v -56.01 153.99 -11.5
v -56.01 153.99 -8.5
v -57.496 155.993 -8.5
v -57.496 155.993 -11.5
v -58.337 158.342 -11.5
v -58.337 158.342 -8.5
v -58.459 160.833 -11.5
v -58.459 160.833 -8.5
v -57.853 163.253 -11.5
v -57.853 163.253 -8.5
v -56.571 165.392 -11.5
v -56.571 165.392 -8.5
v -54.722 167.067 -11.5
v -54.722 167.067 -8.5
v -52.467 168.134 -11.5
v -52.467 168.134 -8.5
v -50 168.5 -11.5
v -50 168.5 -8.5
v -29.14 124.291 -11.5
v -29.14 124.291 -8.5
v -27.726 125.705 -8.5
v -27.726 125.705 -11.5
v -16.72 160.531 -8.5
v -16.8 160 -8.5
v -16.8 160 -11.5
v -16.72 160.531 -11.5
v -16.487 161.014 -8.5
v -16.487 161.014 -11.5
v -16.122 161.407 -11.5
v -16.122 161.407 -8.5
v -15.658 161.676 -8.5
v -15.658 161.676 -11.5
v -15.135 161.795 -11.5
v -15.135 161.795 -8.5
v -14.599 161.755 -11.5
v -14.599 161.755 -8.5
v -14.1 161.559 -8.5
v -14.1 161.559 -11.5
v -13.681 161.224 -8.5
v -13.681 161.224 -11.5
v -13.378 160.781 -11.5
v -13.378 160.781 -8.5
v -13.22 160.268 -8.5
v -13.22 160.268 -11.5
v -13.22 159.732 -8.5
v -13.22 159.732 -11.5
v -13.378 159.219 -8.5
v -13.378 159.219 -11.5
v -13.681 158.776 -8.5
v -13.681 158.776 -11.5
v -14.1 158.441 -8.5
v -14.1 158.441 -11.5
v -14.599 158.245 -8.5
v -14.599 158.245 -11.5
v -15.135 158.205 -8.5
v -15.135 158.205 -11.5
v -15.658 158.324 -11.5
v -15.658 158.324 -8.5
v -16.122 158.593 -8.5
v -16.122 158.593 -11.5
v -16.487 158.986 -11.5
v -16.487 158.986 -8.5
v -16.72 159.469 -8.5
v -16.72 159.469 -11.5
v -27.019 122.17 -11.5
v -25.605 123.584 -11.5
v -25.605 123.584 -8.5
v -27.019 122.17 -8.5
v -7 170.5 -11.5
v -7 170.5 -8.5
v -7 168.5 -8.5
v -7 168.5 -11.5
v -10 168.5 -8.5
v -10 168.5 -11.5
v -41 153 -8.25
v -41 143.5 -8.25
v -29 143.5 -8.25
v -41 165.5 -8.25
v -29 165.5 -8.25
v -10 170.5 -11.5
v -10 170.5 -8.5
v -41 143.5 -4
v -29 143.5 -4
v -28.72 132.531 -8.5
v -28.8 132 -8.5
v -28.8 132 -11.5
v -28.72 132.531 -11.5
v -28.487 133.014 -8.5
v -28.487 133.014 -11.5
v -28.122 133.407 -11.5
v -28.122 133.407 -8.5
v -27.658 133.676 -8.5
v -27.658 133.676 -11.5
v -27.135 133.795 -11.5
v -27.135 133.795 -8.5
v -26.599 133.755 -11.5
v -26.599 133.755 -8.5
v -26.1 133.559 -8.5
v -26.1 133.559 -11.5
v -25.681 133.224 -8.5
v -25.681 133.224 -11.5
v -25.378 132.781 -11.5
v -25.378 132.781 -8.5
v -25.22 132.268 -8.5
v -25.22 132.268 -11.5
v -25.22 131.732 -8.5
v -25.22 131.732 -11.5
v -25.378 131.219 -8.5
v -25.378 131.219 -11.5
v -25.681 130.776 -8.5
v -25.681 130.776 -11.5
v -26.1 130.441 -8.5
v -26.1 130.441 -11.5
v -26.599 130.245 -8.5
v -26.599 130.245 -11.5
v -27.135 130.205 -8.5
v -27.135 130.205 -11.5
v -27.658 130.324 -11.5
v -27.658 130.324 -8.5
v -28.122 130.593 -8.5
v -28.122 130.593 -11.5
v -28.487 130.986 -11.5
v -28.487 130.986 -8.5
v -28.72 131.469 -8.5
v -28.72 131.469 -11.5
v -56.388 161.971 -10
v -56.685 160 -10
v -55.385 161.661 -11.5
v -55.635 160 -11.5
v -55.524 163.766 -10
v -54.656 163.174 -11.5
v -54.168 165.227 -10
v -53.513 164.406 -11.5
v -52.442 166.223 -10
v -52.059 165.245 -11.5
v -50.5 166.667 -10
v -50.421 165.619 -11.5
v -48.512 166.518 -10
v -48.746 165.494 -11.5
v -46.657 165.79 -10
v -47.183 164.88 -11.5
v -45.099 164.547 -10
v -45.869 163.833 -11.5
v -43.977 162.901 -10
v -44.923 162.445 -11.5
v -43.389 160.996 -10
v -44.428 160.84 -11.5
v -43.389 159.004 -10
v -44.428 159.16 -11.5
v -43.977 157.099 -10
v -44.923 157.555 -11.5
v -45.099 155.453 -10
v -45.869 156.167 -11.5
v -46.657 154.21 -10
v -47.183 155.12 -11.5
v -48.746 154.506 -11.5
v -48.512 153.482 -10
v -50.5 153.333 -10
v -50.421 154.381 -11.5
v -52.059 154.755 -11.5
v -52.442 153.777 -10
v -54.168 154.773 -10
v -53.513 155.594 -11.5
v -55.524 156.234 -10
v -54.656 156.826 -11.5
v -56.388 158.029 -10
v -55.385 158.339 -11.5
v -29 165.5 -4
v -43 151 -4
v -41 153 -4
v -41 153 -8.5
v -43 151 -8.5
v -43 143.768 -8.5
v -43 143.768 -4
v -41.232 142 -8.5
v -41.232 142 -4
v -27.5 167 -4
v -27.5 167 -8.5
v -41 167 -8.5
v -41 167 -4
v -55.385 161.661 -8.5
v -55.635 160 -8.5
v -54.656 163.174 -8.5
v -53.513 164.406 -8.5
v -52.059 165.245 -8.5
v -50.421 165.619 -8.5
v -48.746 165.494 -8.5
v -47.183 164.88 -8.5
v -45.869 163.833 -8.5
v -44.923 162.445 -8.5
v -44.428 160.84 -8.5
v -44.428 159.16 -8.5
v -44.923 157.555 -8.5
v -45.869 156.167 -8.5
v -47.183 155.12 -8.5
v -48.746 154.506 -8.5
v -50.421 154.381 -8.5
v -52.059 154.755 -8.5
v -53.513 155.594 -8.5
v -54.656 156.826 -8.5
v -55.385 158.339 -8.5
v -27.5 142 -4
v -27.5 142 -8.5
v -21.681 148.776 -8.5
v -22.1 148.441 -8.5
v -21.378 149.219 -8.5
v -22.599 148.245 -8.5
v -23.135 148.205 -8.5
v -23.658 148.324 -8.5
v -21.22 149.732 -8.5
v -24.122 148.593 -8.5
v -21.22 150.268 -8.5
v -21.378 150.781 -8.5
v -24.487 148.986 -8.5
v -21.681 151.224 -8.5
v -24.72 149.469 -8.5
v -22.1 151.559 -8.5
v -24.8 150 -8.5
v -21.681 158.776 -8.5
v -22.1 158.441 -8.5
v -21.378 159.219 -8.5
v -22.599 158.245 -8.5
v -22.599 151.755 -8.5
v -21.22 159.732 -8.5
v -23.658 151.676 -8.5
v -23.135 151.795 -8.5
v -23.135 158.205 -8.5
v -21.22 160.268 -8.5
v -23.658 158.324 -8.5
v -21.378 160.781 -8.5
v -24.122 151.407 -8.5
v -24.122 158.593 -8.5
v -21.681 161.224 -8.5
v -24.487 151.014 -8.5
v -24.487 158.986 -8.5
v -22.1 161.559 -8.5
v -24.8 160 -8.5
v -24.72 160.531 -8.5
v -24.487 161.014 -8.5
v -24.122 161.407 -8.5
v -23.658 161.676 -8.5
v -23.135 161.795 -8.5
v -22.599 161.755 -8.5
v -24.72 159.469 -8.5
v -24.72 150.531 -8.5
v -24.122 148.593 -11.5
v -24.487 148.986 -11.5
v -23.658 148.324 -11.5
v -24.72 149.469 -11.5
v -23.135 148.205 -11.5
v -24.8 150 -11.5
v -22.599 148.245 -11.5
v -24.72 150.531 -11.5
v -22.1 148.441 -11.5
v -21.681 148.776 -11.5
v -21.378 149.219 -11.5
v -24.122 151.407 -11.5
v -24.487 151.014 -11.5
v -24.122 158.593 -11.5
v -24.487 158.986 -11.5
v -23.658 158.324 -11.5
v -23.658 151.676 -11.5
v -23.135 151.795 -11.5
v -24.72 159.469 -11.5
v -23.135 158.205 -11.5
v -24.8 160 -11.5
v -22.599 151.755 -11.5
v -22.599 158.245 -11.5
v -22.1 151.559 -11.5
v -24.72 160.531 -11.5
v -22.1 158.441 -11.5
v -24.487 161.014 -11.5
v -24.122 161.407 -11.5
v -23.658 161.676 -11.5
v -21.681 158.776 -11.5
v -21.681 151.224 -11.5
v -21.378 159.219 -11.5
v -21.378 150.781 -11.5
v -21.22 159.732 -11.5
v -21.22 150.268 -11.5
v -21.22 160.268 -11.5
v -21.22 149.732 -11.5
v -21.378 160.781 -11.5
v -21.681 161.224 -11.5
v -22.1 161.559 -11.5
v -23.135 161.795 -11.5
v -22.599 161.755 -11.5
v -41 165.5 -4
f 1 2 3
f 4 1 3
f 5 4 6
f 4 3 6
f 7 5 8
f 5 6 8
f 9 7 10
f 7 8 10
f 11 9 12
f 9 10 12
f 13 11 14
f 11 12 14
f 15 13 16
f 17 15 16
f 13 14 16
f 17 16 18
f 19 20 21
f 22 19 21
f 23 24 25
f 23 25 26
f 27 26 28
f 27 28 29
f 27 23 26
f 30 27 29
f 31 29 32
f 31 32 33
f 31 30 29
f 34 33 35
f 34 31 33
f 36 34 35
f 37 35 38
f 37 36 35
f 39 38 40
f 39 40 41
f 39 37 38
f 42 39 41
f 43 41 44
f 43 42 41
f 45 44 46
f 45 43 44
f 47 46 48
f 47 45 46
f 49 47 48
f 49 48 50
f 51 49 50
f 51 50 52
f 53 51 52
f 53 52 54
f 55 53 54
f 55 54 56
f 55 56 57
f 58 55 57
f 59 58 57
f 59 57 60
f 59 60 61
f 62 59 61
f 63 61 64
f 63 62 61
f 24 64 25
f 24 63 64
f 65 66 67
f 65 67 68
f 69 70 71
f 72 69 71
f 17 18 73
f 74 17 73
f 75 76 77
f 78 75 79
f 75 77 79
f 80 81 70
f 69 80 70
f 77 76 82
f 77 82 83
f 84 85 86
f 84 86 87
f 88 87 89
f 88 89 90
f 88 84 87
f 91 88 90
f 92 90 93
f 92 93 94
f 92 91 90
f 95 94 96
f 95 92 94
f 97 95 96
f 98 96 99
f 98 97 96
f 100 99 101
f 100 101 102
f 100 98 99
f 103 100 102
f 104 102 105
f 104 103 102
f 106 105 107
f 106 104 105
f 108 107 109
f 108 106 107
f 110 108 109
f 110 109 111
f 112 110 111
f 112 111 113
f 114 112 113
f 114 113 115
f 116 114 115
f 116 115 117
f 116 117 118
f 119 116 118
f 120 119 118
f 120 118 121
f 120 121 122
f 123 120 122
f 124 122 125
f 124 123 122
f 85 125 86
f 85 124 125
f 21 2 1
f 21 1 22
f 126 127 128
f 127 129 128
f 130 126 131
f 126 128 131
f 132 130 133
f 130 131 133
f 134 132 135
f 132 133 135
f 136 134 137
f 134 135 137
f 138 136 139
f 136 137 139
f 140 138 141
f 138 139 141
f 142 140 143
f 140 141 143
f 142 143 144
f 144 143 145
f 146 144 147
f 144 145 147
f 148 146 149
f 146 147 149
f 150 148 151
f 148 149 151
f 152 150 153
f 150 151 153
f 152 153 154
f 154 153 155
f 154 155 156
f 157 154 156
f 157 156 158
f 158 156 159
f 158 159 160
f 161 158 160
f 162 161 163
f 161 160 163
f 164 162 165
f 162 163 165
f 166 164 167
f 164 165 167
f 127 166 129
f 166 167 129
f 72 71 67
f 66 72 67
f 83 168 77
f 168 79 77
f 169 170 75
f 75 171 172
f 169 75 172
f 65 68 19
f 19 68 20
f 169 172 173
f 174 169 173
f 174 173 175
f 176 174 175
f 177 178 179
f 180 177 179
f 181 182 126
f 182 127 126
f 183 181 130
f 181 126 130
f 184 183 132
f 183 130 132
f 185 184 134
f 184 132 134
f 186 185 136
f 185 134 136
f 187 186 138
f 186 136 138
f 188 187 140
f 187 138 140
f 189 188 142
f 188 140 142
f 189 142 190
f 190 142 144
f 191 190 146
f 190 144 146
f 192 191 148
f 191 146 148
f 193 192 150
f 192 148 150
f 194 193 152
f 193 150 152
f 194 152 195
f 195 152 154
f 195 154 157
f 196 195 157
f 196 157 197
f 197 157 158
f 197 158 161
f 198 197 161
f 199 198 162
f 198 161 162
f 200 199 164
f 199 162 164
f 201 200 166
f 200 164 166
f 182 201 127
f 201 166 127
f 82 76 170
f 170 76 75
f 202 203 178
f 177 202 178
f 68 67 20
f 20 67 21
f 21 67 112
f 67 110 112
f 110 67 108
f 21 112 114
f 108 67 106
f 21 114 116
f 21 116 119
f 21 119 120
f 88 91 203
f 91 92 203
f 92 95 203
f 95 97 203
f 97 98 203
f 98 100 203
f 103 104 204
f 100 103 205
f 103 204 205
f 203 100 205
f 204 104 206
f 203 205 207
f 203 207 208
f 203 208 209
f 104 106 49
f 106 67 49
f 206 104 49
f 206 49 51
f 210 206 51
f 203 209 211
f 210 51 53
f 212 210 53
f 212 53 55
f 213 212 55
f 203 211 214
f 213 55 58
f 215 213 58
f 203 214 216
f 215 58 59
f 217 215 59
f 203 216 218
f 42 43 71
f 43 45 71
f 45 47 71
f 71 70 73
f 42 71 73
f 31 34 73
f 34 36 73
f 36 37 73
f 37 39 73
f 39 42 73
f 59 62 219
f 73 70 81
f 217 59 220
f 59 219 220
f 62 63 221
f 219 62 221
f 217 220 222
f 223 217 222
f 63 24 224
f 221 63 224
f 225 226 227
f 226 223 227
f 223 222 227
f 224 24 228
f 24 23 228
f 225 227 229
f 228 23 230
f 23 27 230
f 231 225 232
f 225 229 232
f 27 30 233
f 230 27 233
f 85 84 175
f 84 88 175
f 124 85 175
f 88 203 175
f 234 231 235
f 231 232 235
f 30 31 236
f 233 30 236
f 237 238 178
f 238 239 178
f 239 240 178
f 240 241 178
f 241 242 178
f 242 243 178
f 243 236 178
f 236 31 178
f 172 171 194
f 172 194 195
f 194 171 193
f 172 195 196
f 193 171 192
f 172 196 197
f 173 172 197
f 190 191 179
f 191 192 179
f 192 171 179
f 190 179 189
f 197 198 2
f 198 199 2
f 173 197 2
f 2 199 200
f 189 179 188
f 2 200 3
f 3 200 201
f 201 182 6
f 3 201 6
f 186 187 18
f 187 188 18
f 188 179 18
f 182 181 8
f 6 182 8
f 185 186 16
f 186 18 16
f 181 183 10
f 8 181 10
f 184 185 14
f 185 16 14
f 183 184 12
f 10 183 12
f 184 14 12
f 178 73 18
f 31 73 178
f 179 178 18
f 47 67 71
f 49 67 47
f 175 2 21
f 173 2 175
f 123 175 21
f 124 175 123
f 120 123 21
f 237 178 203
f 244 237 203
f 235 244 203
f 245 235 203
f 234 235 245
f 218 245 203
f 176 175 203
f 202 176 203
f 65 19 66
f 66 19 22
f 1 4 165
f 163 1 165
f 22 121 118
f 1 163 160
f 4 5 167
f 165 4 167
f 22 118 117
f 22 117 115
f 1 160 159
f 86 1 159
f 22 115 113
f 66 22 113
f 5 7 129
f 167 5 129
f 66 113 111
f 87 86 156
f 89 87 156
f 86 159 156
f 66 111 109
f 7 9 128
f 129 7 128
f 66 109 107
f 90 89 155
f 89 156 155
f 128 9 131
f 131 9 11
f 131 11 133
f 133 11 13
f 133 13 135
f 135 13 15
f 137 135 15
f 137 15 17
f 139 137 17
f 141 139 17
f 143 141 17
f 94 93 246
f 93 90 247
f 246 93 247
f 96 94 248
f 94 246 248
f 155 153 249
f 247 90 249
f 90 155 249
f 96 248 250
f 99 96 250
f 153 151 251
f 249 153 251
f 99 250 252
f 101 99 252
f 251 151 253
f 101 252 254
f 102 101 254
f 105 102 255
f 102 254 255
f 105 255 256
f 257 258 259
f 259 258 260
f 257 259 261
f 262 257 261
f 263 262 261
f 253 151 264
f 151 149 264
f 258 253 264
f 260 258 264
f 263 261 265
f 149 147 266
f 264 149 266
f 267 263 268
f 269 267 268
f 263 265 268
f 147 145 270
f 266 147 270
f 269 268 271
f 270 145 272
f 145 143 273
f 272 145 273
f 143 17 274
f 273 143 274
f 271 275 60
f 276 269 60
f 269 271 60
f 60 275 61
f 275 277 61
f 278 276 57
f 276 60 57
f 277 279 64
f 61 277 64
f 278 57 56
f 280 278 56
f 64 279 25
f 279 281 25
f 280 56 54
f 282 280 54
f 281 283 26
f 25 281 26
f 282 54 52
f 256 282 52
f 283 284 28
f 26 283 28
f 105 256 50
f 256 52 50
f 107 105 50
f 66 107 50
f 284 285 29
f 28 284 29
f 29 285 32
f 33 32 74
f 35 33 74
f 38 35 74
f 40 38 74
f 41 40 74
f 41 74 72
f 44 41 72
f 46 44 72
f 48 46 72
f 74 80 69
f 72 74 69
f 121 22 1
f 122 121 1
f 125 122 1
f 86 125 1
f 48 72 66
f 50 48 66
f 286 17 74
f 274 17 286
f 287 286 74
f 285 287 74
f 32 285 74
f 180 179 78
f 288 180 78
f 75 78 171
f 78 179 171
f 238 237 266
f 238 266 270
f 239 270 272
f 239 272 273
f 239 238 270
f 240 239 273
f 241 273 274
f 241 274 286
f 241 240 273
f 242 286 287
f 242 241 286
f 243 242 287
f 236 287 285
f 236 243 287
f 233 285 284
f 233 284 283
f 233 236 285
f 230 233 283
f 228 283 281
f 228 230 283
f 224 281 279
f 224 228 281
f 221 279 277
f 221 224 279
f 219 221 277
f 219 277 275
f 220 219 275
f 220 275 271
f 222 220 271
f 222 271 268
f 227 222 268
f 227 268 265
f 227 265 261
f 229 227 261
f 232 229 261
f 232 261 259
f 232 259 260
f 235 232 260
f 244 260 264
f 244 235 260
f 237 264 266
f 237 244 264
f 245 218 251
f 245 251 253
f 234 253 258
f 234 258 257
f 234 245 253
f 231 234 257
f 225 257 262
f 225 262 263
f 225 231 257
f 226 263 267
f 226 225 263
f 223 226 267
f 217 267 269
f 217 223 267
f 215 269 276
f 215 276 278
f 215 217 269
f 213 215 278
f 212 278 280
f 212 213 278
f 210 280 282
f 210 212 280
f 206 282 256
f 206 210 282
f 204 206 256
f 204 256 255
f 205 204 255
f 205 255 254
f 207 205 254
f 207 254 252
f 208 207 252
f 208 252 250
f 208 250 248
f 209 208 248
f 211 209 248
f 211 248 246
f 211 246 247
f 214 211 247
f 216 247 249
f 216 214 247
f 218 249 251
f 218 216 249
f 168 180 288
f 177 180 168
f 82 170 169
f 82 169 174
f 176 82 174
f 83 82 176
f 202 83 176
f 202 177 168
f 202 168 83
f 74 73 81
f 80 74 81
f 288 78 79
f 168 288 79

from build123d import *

# Parameters (mm, degrees)
SKETCH220_R     = 8
SKETCH220_R_2   = 1.8
PAD127056_DEPTH = 3
SKETCH185_R     = 1.5
PAD127021_DEPTH = 1.75
SKETCH184_W     = 22
SKETCH184_H     = 12
PAD127020_DEPTH = 22.5
PAD127023_DEPTH = 5


with BuildPart() as base:
    # Sketch220 → Pad127056 (new body)
    with BuildSketch(Plane(origin=(50, 160, -8.5), x_dir=(1, 0, 0), z_dir=(0, 0, 1))):
        with BuildLine():
            ThreePointArc((6.010433, -6.010382), (7.852969, 3.252826), (0, 8.5))
            Line((0, 8.5), (-40, 8.5))
            Line((-40, 8.5), (-40, 10.5))
            Line((-40, 10.5), (-43, 10.5))
            Line((-43, 10.5), (-43, 8.5))
            Line((-43, 8.5), (-24.395158, -36.415973))
            Line((-24.395158, -36.415973), (-22.980945, -37.830187))
            Line((-22.980945, -37.830187), (-20.859624, -35.708867))
            Line((-20.859624, -35.708867), (-22.273838, -34.294653))
            Line((6.010433, -6.010382), (-22.273838, -34.294653))
        make_face()
        Circle(SKETCH220_R, mode=Mode.SUBTRACT)
        with Locations((-27, 0)):
            Circle(SKETCH220_R_2, mode=Mode.SUBTRACT)
        with Locations((-27, -10)):
            Circle(SKETCH220_R_2, mode=Mode.SUBTRACT)
        with Locations((-23, -28)):
            Circle(SKETCH220_R_2, mode=Mode.SUBTRACT)
        with Locations((-35, 0)):
            Circle(SKETCH220_R_2, mode=Mode.SUBTRACT)
    extrude(amount=-PAD127056_DEPTH)


with BuildPart() as outerrace:
    # Sketch221 → Revolution010 (revolve)
    with BuildSketch(Plane(origin=(50, 160, -10), x_dir=(1, 0, 0), z_dir=(0, -1, 0))):
        Polygon((5.634953, 1.5), (6.685264, 0), (5.634953, -1.5), (8, -1.5), (8, 1.5), align=None)
    revolve(axis=Axis((50, 160, -10), (0, 0, 1)))


with BuildPart() as pad127021:
    # Sketch185 → Pad127021 (new body)
    with BuildSketch(Plane(origin=(35, 160, 26.5), x_dir=(0, 1, 0), z_dir=(0, 0, 1))):
        Polygon((5.5, 6), (-16.5, 6), (-20.5, 6), (-20.5, -6), (-16.5, -6), (5.5, -6), (9.5, -6), (9.5, 6), align=None)
        with Locations((7.25, 0)):
            Circle(SKETCH185_R, mode=Mode.SUBTRACT)
        with Locations((-18.25, 0)):
            Circle(SKETCH185_R, mode=Mode.SUBTRACT)
    extrude(amount=PAD127021_DEPTH)


with BuildPart() as servovisual:
    # Sketch184 → Pad127020 (new body)
    with BuildSketch(Plane(origin=(35, 160, 11.75), x_dir=(0, 1, 0), z_dir=(0, 0, 1))):
        with Locations((-5.5, 0)):
            Rectangle(SKETCH184_W, SKETCH184_H)
    extrude(amount=PAD127020_DEPTH)

    # Fusion004020023: union Pad127021
    add(pad127021.part)


with BuildPart() as servovisual_1:
    # Fusion004020023 placement: moved
    add(servovisual.part.moved(Location((0, 0, -20))))


with BuildPart() as fusion004020031:
    # Sketch187 → Pad127023 (new body)
    with BuildSketch(Plane(origin=(35, 160, -9), x_dir=(0, 1, 0), z_dir=(0, 0, 1))):
        Polygon((-18, 7.5), (7, 7.5), (7, -6), (-7, -6), (-9, -8), (-16.232233, -8), (-18, -6.232233), align=None)
    extrude(amount=PAD127023_DEPTH)

    # Cut007019029: cut ServoVisual
    add(servovisual_1.part, mode=Mode.SUBTRACT)

    # Fusion004020031: union Base, OuterRace
    add(base.part)
    add(outerrace.part)


with BuildPart() as part_mirroring014:
    # Part__Mirroring014: instance of Fusion004020031
    add(fusion004020031.part.mirror(Plane(origin=(0, 0, 0), x_dir=(0, -1, 0), z_dir=(1, 0, 0))))


solid = part_mirroring014.part
